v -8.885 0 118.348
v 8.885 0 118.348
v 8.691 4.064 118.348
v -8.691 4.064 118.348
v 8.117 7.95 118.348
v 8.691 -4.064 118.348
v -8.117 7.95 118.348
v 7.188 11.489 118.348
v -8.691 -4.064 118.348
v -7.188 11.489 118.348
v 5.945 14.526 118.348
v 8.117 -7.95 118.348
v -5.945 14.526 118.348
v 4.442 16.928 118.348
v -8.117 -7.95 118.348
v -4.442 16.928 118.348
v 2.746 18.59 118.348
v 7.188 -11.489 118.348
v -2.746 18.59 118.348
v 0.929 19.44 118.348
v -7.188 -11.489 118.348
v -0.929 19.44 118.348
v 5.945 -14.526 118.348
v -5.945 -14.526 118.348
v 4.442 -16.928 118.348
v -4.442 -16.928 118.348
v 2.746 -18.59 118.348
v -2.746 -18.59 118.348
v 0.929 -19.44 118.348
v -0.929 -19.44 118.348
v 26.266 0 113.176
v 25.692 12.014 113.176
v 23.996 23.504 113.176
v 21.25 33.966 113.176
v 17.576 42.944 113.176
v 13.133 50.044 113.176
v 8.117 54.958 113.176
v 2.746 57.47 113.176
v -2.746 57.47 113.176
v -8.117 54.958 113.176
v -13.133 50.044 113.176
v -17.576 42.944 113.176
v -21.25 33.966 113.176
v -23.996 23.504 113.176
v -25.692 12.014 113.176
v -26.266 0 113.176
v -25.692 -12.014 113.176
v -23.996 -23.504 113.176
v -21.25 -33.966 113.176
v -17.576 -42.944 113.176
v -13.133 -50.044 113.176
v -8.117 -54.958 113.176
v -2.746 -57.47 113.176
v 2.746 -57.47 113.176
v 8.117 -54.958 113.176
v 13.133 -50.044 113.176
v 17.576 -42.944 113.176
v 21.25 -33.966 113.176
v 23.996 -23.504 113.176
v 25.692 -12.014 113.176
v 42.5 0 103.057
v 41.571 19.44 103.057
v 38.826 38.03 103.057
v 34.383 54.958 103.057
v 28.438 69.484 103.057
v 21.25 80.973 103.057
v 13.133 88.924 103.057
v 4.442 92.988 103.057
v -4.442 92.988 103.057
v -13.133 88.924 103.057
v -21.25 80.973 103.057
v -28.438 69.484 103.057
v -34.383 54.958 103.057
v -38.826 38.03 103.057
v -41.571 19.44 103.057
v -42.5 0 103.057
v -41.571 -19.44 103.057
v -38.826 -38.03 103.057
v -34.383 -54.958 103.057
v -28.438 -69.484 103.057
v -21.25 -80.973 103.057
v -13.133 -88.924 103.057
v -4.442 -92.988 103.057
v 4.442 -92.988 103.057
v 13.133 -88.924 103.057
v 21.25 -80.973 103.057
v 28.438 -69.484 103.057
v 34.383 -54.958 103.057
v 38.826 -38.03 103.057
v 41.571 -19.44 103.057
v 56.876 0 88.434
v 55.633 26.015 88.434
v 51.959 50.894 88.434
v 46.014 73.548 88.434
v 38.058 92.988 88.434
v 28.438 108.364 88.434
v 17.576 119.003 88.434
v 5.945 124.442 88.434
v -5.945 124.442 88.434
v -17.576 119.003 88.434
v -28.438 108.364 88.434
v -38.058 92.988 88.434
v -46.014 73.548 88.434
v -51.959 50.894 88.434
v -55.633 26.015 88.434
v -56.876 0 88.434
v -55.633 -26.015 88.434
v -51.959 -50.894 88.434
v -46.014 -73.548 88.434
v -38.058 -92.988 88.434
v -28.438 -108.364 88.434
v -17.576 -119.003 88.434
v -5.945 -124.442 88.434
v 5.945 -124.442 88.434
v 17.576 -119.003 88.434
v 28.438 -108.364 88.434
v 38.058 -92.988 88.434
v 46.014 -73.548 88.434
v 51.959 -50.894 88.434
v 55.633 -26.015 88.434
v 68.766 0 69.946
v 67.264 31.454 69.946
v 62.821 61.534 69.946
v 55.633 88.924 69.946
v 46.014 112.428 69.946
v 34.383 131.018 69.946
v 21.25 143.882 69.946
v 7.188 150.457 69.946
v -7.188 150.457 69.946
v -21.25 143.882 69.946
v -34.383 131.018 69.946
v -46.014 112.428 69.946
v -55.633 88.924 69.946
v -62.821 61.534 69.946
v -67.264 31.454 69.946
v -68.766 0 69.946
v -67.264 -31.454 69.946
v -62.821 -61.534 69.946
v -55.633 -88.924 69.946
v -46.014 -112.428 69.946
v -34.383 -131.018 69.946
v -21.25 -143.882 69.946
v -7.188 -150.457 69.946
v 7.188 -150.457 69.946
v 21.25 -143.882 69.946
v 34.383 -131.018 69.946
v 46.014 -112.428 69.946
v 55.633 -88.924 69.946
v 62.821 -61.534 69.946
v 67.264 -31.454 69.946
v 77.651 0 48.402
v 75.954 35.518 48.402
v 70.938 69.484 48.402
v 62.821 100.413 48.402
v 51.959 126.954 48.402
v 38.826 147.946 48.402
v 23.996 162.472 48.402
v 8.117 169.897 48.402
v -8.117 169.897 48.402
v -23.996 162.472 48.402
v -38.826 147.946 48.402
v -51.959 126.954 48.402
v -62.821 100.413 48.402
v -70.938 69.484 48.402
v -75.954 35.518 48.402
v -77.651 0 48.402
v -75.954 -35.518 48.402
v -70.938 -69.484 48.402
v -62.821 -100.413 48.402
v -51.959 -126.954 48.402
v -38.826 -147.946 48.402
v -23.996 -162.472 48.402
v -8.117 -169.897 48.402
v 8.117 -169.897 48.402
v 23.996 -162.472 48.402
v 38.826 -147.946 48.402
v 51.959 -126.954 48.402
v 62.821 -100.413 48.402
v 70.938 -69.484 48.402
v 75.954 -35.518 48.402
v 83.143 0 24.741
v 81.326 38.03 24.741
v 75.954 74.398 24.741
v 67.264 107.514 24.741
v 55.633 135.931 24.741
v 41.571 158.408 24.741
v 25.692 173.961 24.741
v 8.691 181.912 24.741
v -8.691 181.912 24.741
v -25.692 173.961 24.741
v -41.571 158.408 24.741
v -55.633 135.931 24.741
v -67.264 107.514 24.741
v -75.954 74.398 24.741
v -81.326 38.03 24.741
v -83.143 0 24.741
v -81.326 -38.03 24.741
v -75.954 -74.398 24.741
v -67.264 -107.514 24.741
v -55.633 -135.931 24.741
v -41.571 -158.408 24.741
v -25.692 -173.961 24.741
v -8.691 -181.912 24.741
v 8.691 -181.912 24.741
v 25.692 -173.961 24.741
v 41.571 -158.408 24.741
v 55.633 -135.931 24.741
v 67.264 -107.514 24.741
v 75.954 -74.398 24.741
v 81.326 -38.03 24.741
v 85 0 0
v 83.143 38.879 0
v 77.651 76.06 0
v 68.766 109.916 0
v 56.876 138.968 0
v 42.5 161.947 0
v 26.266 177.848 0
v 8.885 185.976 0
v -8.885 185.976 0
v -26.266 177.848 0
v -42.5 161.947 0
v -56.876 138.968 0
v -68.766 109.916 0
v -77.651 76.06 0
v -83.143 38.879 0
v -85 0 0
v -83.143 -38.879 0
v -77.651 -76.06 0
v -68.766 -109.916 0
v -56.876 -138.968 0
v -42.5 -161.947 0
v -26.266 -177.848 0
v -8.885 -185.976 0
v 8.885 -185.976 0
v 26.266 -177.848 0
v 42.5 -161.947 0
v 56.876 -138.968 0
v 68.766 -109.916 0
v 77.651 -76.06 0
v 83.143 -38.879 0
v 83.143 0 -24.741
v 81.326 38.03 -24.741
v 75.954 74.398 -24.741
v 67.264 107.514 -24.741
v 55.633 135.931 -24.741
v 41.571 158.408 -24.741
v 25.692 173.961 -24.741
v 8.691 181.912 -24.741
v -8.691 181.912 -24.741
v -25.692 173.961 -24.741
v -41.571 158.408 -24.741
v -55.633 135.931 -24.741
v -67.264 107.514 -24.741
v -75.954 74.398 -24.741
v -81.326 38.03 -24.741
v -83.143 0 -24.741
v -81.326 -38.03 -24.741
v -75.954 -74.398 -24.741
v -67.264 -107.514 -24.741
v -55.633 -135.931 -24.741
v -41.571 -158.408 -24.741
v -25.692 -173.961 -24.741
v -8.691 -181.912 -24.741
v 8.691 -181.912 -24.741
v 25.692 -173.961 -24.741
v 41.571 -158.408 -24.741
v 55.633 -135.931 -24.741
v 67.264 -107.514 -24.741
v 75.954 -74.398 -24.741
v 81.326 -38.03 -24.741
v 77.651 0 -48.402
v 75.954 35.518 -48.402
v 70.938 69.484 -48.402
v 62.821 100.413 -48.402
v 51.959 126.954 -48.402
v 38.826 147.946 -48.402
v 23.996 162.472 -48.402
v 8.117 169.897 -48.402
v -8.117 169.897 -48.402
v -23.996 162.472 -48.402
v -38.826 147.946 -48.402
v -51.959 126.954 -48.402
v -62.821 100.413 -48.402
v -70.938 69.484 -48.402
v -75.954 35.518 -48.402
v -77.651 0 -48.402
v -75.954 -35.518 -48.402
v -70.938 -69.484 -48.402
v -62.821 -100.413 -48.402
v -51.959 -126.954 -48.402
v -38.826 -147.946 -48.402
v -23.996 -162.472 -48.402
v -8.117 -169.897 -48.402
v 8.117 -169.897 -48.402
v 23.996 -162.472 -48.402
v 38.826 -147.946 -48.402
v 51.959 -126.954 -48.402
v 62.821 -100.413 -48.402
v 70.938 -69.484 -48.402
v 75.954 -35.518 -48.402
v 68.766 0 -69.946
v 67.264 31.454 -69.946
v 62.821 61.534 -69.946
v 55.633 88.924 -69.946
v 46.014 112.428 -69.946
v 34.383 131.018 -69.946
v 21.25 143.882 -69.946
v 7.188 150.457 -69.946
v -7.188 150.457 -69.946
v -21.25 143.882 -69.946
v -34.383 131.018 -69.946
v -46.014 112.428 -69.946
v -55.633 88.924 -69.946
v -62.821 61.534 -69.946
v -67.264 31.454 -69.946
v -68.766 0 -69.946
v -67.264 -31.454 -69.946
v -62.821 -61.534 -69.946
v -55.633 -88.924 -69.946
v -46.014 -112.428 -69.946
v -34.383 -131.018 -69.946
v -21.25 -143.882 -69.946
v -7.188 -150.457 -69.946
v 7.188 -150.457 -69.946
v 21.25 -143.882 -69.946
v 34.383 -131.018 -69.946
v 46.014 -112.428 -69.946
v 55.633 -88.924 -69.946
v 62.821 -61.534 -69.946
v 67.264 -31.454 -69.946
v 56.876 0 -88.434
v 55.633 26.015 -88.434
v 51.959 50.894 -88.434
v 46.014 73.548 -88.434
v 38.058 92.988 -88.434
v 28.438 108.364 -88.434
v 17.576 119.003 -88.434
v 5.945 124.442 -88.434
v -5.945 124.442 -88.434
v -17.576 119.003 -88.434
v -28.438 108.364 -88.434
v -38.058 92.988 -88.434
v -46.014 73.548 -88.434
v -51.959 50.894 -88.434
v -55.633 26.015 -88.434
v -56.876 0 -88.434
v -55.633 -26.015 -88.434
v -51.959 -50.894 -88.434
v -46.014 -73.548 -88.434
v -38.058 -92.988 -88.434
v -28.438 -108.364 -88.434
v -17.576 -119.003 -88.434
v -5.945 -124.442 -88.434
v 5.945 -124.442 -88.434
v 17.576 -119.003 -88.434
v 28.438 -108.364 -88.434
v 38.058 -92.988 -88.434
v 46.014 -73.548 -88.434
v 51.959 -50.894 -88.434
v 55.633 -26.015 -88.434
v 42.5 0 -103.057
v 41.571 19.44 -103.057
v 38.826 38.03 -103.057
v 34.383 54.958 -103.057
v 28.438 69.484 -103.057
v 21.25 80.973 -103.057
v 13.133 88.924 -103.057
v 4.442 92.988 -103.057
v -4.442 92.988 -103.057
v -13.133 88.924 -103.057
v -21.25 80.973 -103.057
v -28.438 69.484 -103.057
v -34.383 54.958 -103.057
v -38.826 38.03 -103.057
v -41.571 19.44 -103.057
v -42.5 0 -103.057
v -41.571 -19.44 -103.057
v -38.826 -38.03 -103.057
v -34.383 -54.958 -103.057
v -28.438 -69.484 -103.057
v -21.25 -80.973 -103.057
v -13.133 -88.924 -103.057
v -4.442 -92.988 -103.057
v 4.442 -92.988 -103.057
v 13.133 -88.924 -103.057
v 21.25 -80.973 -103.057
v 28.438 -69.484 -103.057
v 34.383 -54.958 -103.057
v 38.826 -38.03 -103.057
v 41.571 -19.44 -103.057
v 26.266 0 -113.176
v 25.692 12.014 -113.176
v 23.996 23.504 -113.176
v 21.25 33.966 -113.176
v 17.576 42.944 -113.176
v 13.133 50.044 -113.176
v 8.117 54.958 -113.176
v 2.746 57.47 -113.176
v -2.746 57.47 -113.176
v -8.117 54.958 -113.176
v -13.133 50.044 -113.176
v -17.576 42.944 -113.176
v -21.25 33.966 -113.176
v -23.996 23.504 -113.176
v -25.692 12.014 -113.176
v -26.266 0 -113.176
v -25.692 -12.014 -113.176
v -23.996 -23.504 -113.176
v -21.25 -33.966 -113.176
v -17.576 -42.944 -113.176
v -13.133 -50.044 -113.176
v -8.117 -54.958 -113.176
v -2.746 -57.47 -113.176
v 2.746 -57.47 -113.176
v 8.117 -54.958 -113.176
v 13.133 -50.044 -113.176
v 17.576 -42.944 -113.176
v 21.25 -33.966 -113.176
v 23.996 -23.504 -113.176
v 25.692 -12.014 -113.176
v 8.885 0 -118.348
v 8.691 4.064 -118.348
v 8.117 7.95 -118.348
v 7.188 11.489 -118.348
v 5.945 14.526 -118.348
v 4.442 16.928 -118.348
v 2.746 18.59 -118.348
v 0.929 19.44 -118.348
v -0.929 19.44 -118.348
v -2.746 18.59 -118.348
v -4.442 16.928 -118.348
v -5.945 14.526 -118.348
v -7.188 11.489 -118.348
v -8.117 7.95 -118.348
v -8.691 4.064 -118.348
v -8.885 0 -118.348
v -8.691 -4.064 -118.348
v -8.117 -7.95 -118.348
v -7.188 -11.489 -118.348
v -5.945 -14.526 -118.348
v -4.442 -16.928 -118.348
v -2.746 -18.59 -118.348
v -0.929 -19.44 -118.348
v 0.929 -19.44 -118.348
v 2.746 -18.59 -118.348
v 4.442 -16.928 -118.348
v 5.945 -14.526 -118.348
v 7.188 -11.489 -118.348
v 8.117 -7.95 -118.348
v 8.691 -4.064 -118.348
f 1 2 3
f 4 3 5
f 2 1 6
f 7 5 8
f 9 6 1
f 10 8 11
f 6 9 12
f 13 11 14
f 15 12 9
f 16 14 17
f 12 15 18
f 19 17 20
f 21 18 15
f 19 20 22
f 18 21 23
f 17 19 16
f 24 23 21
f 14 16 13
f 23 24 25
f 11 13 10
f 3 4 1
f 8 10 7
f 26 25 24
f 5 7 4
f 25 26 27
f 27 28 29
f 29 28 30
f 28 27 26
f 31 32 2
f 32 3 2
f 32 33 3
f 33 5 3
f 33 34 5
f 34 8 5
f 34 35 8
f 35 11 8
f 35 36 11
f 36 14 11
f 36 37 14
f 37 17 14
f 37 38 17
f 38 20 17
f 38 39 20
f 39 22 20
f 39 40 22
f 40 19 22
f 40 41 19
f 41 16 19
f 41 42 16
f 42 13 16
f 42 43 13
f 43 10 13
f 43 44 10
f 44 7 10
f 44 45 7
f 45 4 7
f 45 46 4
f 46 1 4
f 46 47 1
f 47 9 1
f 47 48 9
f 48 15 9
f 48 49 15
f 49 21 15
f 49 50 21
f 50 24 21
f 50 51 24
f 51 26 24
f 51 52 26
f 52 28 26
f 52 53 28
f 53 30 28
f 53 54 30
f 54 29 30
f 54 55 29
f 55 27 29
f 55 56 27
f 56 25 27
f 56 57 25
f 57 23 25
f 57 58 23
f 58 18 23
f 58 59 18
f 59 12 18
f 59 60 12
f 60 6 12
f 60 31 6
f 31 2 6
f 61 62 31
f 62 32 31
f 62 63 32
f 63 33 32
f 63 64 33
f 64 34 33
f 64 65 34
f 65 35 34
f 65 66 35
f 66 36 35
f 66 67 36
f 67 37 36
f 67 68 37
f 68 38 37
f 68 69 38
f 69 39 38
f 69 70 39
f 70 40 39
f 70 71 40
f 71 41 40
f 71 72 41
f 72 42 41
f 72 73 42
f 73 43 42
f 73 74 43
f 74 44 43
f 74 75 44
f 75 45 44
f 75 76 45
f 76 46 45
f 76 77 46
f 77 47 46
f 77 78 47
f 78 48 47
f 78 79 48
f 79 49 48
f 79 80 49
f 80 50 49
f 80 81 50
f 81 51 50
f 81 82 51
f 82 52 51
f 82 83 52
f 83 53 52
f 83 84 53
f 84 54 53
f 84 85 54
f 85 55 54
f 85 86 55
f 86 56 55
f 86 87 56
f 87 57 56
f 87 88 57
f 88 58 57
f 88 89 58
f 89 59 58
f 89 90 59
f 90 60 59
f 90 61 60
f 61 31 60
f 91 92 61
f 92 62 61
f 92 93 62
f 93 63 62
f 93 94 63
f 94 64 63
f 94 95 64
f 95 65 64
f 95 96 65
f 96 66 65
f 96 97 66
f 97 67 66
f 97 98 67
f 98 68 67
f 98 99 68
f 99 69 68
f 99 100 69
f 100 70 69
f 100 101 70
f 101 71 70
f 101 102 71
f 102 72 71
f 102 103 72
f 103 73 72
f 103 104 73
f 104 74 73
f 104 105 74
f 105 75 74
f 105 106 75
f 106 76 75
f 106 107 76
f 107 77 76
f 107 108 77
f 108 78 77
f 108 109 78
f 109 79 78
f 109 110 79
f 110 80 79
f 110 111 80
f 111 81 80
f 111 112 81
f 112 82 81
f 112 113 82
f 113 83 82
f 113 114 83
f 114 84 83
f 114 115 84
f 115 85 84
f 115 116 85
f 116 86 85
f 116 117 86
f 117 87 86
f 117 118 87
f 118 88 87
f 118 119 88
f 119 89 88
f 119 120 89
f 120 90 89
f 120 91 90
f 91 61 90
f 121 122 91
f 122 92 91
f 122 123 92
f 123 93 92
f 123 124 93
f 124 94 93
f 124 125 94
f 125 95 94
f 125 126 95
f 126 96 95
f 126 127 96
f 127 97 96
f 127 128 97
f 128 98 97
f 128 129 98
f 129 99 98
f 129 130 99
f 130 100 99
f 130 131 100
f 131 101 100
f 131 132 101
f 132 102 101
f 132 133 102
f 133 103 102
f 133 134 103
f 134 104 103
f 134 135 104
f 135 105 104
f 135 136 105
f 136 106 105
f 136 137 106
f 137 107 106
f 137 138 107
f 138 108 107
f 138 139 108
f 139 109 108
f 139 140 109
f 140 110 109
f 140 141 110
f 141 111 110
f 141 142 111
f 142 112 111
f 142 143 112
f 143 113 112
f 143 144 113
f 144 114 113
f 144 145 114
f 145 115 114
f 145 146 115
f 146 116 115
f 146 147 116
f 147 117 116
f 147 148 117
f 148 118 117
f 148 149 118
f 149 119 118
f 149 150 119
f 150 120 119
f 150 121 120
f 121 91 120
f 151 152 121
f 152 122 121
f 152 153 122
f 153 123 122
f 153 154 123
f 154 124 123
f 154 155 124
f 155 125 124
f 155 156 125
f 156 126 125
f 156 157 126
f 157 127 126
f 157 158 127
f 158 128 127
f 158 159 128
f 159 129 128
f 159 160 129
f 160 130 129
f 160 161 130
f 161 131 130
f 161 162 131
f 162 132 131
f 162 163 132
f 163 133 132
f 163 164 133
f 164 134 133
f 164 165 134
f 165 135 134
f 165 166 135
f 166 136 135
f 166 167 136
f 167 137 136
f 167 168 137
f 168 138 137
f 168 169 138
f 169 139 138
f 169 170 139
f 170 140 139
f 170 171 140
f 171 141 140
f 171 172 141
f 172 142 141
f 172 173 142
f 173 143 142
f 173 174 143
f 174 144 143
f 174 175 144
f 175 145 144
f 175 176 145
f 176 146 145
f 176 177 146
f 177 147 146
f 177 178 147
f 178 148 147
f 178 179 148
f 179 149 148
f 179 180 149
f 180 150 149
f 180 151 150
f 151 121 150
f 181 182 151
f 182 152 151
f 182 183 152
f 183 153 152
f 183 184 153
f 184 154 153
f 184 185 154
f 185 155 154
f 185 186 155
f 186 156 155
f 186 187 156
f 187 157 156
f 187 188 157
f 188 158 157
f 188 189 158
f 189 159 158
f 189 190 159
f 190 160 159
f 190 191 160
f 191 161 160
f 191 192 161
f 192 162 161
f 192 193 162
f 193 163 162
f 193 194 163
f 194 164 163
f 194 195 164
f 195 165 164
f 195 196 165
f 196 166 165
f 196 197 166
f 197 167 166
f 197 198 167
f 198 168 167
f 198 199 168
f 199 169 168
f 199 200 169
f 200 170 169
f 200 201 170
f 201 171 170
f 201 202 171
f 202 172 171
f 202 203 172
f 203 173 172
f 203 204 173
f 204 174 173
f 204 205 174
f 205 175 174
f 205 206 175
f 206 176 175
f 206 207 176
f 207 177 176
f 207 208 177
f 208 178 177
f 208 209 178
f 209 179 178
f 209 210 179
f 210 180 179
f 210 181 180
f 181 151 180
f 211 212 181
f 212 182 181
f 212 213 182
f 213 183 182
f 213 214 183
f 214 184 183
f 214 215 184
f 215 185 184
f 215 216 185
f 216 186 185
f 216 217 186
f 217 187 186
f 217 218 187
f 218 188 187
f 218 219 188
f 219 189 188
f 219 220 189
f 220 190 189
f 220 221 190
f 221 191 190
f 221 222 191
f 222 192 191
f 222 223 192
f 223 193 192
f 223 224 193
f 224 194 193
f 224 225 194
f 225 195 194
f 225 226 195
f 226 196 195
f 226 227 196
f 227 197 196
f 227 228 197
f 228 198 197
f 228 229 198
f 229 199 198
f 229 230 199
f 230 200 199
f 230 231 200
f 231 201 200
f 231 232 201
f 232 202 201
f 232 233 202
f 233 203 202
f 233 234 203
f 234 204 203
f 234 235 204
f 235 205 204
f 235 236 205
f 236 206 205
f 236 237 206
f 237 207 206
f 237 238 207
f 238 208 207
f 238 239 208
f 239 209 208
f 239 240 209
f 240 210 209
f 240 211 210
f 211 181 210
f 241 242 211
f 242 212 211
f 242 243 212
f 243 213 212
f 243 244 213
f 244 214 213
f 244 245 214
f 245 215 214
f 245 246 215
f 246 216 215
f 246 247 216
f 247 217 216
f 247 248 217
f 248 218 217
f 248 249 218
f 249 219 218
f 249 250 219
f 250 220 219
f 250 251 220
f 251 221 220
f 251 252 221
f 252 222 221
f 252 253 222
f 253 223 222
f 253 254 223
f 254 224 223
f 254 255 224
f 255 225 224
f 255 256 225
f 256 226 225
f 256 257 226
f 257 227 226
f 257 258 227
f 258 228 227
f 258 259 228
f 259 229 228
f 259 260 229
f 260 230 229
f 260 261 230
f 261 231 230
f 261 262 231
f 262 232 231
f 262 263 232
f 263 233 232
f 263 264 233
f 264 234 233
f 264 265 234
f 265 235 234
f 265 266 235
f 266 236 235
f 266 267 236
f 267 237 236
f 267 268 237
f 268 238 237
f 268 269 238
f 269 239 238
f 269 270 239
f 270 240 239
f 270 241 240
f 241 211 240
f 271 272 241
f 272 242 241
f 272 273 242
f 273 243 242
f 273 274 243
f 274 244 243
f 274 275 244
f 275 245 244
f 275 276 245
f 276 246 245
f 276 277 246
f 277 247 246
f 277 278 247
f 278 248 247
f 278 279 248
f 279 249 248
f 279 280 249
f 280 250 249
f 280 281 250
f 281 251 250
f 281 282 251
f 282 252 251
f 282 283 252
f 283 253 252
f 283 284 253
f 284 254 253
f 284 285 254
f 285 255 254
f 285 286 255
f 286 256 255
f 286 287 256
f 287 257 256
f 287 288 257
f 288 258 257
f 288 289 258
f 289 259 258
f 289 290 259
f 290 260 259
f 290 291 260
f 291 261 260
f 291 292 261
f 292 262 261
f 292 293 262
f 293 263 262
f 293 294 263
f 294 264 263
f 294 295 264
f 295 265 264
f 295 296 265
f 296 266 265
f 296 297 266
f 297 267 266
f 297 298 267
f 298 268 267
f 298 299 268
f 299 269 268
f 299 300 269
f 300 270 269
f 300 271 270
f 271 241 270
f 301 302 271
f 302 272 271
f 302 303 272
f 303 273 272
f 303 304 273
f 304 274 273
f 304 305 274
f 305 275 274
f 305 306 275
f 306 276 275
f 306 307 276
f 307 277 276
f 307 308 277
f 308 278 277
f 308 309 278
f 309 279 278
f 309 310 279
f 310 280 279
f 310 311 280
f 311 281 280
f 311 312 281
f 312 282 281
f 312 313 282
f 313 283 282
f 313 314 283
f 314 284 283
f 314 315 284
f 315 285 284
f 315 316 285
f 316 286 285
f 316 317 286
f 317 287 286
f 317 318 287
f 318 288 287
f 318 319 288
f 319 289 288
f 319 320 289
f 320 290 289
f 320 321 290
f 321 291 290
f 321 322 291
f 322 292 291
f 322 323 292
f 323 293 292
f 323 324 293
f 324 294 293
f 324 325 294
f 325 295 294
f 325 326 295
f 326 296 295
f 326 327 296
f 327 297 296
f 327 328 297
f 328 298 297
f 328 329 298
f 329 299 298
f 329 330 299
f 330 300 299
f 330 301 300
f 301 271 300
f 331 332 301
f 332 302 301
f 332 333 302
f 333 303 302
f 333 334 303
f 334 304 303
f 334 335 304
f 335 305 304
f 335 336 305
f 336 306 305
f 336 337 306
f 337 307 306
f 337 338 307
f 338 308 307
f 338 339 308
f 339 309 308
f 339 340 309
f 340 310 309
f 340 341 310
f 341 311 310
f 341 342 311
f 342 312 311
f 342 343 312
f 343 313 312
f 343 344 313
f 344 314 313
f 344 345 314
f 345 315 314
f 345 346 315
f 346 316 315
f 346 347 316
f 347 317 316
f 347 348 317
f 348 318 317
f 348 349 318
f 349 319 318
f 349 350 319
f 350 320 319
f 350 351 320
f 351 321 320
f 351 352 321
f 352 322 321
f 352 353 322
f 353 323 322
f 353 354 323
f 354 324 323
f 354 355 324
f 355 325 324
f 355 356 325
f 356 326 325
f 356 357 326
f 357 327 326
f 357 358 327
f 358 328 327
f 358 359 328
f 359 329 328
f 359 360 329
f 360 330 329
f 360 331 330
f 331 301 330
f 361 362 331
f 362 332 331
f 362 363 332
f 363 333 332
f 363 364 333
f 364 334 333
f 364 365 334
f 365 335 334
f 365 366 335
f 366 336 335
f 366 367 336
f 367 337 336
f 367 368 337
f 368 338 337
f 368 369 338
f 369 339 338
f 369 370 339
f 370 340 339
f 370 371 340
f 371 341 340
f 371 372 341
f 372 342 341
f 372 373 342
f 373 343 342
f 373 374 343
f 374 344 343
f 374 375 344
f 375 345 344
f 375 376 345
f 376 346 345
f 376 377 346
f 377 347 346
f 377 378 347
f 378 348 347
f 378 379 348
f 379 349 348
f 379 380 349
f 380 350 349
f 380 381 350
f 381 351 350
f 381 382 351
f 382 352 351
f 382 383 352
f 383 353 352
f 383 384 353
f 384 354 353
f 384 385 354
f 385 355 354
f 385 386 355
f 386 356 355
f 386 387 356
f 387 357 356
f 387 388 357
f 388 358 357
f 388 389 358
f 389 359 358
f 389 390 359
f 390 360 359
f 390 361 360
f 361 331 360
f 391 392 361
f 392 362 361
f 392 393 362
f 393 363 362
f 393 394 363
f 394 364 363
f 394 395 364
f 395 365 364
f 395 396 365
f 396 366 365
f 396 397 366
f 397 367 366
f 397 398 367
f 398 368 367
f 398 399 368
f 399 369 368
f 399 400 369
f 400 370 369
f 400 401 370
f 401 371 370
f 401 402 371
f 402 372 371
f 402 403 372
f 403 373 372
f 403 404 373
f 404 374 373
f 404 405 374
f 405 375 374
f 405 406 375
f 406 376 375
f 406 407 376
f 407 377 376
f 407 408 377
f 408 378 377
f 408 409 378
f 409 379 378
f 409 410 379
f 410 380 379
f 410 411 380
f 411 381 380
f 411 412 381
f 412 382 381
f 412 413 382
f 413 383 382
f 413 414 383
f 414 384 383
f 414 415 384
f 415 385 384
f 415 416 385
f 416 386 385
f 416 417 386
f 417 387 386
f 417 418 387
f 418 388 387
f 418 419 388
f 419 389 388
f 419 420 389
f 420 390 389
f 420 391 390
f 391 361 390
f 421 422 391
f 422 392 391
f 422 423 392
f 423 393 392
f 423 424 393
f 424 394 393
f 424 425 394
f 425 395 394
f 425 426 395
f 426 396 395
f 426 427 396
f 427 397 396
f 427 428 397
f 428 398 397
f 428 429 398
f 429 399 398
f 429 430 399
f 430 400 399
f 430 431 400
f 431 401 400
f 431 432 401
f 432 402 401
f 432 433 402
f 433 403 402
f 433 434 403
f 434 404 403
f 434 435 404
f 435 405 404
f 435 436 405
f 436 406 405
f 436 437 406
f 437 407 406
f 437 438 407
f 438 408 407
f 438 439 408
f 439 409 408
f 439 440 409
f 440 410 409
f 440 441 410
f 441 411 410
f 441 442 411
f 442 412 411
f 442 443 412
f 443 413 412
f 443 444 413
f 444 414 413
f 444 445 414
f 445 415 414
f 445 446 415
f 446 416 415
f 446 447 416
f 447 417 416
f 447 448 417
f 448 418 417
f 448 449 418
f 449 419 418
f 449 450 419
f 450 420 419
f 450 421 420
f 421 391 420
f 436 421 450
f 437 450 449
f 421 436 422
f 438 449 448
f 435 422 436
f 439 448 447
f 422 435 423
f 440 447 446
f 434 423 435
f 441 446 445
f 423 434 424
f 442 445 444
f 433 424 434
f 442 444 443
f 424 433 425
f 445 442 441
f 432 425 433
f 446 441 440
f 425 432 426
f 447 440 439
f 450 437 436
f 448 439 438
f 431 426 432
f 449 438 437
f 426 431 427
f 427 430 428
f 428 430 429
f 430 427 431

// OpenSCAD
// Generated by SolidPython 1.0.1 on 2020-07-29 00:46:46


scale(v = [5, 11, 7]) {
	sphere(r = 17);
}
/***********************************************
*********      SolidPython code:      **********
************************************************
 
# import packages: SolidPython
from solid import *
from solid.utils import *
from itertools import chain, combinations, permutations


class Resize:

    def __init__(self, scad_file):
        self.scad_file = scad_file
        #self.scad_file = import_scad(scad_file)
        # cone/cylinder param:
        self.r1 = 0
        self.r2 = 0
        self.h = 0
        # rectangular prism param:
        self.w = 0
        self.l = 0
        # ellipse param:
        self.r = 0

    # import OpenScad code (file name corresponds to shape)


    # classify shape + parameters
    def assign(self, param1, param2, param3):
        if self.scad_file == 'cone.scad':
            self.r1 = param1
            self.r2 = param2
            self.h = param3
        elif self.scad_file == 'cylinder.scad':
            self.r1 = param1
            self.r2 = param2
            self.h = param3
        elif self.scad_file == 'rectangularPrism.scad':
            self.h = param1
            self.l = param2
            self.w = param3
        else:
            self.r = param1
            self.h = param2

    # resize parameters
    def iterate(self):
        x = range(3, 20, 2)
        i = 1
        if self.scad_file == 'cone.scad':
            tempList = list(permutations(x, 2))
            for temp in tempList:
                param1 = temp[0]
                param2 = temp[1]
                filepath = 'produced_scad_files/' + 'cone' + str(param1) + '_' + str(param2) + '_' + '.scad'
                scad_render_to_file(cylinder(h=param1, r1=param2, r2=0), filepath)

        elif self.scad_file == 'cylinder.scad':
            tempList = list(permutations(x, 3))
            for temp in tempList:
                param1 = temp[0]
                param2 = temp[1]
                filepath = 'produced_scad_files/' + 'cylinder' + str(param1) + '_' + str(param2) + '_' + '.scad'
                scad_render_to_file(cylinder(h=param1, r1=param2, r2=param2), filepath)

        elif self.scad_file == 'rectangularPrism.scad':
            tempList = list(permutations(x, 3))
            for temp in tempList:
                param1 = temp[0]
                param2 = temp[1]
                param3 = temp[2]
                filepath = 'produced_scad_files/' + 'rectangularPrism' + str(param1) + '_' + str(param2) + '_' + str(
                    param3) + '.scad'
                scad_render_to_file(cube(size=(param1, param2, param3)), filepath)

        elif self.scad_file == 'ellipse.scad':
            tempList = list(permutations(x, 4))
            for temp in tempList:
                param1 = temp[0]
                param2 = temp[1]
                param3 = temp[2]
                param4 = temp[3]
                filepath = 'produced_scad_files/' + 'ellipse' + str(param1) + '_' + str(param2) + '_' + str(param3) + '_' + str(param4) + '.scad'
                scad_render_to_file(scale([param1, param2, param3])(sphere(r=param4)), filepath)

    def render_to_scadfile(self):
        scad_render_to_file(scad, 'example.scad') 
 
************************************************/
